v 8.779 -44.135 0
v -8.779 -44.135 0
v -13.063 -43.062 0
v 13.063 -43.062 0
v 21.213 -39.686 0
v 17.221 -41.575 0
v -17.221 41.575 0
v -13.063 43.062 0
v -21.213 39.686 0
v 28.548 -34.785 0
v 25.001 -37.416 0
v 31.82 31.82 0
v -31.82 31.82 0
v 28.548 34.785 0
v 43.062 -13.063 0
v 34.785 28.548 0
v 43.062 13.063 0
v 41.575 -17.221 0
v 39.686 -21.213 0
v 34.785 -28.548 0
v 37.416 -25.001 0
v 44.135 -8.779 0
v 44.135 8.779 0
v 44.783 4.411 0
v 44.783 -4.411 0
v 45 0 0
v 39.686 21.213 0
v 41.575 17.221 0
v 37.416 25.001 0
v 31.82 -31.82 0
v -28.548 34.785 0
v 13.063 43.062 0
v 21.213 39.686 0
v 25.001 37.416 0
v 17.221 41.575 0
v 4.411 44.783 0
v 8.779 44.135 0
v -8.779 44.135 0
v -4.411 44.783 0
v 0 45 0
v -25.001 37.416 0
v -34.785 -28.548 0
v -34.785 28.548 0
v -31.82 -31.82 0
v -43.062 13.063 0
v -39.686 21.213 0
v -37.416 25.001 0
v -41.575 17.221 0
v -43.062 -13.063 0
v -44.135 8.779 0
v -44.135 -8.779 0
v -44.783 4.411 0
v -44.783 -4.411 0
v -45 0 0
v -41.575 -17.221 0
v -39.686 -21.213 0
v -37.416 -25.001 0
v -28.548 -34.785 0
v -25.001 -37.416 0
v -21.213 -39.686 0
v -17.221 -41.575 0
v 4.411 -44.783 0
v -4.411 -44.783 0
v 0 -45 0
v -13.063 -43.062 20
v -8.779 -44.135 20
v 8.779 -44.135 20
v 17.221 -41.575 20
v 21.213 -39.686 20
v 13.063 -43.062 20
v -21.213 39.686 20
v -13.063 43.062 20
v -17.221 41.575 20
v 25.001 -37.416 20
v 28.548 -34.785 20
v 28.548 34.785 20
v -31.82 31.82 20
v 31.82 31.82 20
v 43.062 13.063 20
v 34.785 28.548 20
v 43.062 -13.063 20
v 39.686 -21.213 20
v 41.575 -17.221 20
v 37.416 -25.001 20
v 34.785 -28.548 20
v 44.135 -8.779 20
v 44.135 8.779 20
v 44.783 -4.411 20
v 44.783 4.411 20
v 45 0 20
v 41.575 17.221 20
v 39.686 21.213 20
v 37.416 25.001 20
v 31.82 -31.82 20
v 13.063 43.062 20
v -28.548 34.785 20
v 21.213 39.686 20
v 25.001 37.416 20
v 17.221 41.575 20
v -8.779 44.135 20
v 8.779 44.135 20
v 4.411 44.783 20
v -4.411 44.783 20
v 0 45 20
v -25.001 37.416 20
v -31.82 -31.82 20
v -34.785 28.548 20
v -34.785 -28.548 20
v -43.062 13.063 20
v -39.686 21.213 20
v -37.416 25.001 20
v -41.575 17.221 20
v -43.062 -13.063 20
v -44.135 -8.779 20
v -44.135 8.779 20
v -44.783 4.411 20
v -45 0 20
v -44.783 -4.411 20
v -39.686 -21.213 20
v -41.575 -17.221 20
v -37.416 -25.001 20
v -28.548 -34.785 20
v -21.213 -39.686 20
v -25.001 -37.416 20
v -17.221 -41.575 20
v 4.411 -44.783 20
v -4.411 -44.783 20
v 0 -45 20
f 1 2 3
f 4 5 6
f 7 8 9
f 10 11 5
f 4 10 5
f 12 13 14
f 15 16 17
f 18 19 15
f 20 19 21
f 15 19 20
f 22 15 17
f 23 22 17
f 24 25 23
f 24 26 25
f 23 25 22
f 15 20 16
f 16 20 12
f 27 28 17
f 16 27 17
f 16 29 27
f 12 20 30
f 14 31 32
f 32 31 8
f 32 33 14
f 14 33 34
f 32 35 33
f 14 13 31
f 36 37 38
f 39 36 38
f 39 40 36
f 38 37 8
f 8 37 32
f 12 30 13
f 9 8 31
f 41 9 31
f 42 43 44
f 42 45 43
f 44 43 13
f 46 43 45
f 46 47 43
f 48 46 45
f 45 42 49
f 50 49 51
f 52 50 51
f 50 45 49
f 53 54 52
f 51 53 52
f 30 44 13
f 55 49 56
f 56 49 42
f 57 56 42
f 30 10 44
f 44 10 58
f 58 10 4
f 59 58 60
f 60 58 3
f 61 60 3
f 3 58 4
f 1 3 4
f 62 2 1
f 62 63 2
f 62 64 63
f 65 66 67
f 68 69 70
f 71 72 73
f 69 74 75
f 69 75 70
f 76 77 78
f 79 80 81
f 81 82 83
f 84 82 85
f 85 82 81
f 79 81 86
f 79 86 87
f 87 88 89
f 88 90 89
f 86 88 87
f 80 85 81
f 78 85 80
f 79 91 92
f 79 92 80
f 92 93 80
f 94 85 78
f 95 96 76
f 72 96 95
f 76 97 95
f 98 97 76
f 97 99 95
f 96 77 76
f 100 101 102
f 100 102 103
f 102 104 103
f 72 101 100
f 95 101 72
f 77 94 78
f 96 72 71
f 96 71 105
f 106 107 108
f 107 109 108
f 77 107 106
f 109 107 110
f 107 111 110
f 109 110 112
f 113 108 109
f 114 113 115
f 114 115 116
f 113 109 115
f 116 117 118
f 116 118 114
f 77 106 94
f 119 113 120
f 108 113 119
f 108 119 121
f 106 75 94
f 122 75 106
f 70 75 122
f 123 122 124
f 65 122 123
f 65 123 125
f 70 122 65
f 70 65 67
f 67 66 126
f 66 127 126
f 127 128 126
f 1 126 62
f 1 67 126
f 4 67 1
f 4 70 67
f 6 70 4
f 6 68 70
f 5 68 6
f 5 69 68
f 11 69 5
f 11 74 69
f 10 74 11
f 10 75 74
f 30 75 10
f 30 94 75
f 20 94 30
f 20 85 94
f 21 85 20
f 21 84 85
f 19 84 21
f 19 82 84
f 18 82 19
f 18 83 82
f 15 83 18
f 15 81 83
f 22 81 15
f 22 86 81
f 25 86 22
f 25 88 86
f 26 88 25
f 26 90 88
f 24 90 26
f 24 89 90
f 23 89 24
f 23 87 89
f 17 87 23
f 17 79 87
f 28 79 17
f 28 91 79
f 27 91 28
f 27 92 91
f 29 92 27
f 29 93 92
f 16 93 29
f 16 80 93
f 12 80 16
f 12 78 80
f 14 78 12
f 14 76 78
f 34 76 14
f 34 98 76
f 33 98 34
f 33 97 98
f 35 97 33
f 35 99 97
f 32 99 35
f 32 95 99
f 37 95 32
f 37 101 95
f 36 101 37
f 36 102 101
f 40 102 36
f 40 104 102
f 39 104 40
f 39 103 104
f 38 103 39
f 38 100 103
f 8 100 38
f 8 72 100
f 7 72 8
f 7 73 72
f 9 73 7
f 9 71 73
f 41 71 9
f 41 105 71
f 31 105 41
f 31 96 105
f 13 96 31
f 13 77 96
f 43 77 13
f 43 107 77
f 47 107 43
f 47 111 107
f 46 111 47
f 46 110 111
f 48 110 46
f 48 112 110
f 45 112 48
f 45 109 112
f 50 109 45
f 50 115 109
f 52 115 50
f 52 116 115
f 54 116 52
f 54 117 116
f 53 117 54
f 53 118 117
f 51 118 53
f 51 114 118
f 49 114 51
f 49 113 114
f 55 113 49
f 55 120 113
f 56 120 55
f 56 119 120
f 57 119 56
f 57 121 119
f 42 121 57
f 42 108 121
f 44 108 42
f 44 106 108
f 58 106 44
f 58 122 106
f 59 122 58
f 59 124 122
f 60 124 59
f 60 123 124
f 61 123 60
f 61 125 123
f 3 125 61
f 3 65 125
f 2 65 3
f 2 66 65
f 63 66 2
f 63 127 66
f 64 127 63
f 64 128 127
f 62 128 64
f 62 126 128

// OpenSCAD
linear_extrude(height = 20)
  union() {
    circle(r = 45, $fn = 64);
    polygon([[2, 9.798, 0], [2, 11.5, 0], [-2, 11.5, 0], [-2, 9.798, 9.899]]);
    translate([28, 0]) circle(r = 8, $fn = 64);
    translate([14, 24.249]) circle(r = 8, $fn = 64);
    translate([-14, 24.249]) circle(r = 8, $fn = 64);
    translate([-28, 0]) circle(r = 8, $fn = 64);
    translate([-14, -24.249]) circle(r = 8, $fn = 64);
    translate([14, -24.249]) circle(r = 8, $fn = 64);
  }
